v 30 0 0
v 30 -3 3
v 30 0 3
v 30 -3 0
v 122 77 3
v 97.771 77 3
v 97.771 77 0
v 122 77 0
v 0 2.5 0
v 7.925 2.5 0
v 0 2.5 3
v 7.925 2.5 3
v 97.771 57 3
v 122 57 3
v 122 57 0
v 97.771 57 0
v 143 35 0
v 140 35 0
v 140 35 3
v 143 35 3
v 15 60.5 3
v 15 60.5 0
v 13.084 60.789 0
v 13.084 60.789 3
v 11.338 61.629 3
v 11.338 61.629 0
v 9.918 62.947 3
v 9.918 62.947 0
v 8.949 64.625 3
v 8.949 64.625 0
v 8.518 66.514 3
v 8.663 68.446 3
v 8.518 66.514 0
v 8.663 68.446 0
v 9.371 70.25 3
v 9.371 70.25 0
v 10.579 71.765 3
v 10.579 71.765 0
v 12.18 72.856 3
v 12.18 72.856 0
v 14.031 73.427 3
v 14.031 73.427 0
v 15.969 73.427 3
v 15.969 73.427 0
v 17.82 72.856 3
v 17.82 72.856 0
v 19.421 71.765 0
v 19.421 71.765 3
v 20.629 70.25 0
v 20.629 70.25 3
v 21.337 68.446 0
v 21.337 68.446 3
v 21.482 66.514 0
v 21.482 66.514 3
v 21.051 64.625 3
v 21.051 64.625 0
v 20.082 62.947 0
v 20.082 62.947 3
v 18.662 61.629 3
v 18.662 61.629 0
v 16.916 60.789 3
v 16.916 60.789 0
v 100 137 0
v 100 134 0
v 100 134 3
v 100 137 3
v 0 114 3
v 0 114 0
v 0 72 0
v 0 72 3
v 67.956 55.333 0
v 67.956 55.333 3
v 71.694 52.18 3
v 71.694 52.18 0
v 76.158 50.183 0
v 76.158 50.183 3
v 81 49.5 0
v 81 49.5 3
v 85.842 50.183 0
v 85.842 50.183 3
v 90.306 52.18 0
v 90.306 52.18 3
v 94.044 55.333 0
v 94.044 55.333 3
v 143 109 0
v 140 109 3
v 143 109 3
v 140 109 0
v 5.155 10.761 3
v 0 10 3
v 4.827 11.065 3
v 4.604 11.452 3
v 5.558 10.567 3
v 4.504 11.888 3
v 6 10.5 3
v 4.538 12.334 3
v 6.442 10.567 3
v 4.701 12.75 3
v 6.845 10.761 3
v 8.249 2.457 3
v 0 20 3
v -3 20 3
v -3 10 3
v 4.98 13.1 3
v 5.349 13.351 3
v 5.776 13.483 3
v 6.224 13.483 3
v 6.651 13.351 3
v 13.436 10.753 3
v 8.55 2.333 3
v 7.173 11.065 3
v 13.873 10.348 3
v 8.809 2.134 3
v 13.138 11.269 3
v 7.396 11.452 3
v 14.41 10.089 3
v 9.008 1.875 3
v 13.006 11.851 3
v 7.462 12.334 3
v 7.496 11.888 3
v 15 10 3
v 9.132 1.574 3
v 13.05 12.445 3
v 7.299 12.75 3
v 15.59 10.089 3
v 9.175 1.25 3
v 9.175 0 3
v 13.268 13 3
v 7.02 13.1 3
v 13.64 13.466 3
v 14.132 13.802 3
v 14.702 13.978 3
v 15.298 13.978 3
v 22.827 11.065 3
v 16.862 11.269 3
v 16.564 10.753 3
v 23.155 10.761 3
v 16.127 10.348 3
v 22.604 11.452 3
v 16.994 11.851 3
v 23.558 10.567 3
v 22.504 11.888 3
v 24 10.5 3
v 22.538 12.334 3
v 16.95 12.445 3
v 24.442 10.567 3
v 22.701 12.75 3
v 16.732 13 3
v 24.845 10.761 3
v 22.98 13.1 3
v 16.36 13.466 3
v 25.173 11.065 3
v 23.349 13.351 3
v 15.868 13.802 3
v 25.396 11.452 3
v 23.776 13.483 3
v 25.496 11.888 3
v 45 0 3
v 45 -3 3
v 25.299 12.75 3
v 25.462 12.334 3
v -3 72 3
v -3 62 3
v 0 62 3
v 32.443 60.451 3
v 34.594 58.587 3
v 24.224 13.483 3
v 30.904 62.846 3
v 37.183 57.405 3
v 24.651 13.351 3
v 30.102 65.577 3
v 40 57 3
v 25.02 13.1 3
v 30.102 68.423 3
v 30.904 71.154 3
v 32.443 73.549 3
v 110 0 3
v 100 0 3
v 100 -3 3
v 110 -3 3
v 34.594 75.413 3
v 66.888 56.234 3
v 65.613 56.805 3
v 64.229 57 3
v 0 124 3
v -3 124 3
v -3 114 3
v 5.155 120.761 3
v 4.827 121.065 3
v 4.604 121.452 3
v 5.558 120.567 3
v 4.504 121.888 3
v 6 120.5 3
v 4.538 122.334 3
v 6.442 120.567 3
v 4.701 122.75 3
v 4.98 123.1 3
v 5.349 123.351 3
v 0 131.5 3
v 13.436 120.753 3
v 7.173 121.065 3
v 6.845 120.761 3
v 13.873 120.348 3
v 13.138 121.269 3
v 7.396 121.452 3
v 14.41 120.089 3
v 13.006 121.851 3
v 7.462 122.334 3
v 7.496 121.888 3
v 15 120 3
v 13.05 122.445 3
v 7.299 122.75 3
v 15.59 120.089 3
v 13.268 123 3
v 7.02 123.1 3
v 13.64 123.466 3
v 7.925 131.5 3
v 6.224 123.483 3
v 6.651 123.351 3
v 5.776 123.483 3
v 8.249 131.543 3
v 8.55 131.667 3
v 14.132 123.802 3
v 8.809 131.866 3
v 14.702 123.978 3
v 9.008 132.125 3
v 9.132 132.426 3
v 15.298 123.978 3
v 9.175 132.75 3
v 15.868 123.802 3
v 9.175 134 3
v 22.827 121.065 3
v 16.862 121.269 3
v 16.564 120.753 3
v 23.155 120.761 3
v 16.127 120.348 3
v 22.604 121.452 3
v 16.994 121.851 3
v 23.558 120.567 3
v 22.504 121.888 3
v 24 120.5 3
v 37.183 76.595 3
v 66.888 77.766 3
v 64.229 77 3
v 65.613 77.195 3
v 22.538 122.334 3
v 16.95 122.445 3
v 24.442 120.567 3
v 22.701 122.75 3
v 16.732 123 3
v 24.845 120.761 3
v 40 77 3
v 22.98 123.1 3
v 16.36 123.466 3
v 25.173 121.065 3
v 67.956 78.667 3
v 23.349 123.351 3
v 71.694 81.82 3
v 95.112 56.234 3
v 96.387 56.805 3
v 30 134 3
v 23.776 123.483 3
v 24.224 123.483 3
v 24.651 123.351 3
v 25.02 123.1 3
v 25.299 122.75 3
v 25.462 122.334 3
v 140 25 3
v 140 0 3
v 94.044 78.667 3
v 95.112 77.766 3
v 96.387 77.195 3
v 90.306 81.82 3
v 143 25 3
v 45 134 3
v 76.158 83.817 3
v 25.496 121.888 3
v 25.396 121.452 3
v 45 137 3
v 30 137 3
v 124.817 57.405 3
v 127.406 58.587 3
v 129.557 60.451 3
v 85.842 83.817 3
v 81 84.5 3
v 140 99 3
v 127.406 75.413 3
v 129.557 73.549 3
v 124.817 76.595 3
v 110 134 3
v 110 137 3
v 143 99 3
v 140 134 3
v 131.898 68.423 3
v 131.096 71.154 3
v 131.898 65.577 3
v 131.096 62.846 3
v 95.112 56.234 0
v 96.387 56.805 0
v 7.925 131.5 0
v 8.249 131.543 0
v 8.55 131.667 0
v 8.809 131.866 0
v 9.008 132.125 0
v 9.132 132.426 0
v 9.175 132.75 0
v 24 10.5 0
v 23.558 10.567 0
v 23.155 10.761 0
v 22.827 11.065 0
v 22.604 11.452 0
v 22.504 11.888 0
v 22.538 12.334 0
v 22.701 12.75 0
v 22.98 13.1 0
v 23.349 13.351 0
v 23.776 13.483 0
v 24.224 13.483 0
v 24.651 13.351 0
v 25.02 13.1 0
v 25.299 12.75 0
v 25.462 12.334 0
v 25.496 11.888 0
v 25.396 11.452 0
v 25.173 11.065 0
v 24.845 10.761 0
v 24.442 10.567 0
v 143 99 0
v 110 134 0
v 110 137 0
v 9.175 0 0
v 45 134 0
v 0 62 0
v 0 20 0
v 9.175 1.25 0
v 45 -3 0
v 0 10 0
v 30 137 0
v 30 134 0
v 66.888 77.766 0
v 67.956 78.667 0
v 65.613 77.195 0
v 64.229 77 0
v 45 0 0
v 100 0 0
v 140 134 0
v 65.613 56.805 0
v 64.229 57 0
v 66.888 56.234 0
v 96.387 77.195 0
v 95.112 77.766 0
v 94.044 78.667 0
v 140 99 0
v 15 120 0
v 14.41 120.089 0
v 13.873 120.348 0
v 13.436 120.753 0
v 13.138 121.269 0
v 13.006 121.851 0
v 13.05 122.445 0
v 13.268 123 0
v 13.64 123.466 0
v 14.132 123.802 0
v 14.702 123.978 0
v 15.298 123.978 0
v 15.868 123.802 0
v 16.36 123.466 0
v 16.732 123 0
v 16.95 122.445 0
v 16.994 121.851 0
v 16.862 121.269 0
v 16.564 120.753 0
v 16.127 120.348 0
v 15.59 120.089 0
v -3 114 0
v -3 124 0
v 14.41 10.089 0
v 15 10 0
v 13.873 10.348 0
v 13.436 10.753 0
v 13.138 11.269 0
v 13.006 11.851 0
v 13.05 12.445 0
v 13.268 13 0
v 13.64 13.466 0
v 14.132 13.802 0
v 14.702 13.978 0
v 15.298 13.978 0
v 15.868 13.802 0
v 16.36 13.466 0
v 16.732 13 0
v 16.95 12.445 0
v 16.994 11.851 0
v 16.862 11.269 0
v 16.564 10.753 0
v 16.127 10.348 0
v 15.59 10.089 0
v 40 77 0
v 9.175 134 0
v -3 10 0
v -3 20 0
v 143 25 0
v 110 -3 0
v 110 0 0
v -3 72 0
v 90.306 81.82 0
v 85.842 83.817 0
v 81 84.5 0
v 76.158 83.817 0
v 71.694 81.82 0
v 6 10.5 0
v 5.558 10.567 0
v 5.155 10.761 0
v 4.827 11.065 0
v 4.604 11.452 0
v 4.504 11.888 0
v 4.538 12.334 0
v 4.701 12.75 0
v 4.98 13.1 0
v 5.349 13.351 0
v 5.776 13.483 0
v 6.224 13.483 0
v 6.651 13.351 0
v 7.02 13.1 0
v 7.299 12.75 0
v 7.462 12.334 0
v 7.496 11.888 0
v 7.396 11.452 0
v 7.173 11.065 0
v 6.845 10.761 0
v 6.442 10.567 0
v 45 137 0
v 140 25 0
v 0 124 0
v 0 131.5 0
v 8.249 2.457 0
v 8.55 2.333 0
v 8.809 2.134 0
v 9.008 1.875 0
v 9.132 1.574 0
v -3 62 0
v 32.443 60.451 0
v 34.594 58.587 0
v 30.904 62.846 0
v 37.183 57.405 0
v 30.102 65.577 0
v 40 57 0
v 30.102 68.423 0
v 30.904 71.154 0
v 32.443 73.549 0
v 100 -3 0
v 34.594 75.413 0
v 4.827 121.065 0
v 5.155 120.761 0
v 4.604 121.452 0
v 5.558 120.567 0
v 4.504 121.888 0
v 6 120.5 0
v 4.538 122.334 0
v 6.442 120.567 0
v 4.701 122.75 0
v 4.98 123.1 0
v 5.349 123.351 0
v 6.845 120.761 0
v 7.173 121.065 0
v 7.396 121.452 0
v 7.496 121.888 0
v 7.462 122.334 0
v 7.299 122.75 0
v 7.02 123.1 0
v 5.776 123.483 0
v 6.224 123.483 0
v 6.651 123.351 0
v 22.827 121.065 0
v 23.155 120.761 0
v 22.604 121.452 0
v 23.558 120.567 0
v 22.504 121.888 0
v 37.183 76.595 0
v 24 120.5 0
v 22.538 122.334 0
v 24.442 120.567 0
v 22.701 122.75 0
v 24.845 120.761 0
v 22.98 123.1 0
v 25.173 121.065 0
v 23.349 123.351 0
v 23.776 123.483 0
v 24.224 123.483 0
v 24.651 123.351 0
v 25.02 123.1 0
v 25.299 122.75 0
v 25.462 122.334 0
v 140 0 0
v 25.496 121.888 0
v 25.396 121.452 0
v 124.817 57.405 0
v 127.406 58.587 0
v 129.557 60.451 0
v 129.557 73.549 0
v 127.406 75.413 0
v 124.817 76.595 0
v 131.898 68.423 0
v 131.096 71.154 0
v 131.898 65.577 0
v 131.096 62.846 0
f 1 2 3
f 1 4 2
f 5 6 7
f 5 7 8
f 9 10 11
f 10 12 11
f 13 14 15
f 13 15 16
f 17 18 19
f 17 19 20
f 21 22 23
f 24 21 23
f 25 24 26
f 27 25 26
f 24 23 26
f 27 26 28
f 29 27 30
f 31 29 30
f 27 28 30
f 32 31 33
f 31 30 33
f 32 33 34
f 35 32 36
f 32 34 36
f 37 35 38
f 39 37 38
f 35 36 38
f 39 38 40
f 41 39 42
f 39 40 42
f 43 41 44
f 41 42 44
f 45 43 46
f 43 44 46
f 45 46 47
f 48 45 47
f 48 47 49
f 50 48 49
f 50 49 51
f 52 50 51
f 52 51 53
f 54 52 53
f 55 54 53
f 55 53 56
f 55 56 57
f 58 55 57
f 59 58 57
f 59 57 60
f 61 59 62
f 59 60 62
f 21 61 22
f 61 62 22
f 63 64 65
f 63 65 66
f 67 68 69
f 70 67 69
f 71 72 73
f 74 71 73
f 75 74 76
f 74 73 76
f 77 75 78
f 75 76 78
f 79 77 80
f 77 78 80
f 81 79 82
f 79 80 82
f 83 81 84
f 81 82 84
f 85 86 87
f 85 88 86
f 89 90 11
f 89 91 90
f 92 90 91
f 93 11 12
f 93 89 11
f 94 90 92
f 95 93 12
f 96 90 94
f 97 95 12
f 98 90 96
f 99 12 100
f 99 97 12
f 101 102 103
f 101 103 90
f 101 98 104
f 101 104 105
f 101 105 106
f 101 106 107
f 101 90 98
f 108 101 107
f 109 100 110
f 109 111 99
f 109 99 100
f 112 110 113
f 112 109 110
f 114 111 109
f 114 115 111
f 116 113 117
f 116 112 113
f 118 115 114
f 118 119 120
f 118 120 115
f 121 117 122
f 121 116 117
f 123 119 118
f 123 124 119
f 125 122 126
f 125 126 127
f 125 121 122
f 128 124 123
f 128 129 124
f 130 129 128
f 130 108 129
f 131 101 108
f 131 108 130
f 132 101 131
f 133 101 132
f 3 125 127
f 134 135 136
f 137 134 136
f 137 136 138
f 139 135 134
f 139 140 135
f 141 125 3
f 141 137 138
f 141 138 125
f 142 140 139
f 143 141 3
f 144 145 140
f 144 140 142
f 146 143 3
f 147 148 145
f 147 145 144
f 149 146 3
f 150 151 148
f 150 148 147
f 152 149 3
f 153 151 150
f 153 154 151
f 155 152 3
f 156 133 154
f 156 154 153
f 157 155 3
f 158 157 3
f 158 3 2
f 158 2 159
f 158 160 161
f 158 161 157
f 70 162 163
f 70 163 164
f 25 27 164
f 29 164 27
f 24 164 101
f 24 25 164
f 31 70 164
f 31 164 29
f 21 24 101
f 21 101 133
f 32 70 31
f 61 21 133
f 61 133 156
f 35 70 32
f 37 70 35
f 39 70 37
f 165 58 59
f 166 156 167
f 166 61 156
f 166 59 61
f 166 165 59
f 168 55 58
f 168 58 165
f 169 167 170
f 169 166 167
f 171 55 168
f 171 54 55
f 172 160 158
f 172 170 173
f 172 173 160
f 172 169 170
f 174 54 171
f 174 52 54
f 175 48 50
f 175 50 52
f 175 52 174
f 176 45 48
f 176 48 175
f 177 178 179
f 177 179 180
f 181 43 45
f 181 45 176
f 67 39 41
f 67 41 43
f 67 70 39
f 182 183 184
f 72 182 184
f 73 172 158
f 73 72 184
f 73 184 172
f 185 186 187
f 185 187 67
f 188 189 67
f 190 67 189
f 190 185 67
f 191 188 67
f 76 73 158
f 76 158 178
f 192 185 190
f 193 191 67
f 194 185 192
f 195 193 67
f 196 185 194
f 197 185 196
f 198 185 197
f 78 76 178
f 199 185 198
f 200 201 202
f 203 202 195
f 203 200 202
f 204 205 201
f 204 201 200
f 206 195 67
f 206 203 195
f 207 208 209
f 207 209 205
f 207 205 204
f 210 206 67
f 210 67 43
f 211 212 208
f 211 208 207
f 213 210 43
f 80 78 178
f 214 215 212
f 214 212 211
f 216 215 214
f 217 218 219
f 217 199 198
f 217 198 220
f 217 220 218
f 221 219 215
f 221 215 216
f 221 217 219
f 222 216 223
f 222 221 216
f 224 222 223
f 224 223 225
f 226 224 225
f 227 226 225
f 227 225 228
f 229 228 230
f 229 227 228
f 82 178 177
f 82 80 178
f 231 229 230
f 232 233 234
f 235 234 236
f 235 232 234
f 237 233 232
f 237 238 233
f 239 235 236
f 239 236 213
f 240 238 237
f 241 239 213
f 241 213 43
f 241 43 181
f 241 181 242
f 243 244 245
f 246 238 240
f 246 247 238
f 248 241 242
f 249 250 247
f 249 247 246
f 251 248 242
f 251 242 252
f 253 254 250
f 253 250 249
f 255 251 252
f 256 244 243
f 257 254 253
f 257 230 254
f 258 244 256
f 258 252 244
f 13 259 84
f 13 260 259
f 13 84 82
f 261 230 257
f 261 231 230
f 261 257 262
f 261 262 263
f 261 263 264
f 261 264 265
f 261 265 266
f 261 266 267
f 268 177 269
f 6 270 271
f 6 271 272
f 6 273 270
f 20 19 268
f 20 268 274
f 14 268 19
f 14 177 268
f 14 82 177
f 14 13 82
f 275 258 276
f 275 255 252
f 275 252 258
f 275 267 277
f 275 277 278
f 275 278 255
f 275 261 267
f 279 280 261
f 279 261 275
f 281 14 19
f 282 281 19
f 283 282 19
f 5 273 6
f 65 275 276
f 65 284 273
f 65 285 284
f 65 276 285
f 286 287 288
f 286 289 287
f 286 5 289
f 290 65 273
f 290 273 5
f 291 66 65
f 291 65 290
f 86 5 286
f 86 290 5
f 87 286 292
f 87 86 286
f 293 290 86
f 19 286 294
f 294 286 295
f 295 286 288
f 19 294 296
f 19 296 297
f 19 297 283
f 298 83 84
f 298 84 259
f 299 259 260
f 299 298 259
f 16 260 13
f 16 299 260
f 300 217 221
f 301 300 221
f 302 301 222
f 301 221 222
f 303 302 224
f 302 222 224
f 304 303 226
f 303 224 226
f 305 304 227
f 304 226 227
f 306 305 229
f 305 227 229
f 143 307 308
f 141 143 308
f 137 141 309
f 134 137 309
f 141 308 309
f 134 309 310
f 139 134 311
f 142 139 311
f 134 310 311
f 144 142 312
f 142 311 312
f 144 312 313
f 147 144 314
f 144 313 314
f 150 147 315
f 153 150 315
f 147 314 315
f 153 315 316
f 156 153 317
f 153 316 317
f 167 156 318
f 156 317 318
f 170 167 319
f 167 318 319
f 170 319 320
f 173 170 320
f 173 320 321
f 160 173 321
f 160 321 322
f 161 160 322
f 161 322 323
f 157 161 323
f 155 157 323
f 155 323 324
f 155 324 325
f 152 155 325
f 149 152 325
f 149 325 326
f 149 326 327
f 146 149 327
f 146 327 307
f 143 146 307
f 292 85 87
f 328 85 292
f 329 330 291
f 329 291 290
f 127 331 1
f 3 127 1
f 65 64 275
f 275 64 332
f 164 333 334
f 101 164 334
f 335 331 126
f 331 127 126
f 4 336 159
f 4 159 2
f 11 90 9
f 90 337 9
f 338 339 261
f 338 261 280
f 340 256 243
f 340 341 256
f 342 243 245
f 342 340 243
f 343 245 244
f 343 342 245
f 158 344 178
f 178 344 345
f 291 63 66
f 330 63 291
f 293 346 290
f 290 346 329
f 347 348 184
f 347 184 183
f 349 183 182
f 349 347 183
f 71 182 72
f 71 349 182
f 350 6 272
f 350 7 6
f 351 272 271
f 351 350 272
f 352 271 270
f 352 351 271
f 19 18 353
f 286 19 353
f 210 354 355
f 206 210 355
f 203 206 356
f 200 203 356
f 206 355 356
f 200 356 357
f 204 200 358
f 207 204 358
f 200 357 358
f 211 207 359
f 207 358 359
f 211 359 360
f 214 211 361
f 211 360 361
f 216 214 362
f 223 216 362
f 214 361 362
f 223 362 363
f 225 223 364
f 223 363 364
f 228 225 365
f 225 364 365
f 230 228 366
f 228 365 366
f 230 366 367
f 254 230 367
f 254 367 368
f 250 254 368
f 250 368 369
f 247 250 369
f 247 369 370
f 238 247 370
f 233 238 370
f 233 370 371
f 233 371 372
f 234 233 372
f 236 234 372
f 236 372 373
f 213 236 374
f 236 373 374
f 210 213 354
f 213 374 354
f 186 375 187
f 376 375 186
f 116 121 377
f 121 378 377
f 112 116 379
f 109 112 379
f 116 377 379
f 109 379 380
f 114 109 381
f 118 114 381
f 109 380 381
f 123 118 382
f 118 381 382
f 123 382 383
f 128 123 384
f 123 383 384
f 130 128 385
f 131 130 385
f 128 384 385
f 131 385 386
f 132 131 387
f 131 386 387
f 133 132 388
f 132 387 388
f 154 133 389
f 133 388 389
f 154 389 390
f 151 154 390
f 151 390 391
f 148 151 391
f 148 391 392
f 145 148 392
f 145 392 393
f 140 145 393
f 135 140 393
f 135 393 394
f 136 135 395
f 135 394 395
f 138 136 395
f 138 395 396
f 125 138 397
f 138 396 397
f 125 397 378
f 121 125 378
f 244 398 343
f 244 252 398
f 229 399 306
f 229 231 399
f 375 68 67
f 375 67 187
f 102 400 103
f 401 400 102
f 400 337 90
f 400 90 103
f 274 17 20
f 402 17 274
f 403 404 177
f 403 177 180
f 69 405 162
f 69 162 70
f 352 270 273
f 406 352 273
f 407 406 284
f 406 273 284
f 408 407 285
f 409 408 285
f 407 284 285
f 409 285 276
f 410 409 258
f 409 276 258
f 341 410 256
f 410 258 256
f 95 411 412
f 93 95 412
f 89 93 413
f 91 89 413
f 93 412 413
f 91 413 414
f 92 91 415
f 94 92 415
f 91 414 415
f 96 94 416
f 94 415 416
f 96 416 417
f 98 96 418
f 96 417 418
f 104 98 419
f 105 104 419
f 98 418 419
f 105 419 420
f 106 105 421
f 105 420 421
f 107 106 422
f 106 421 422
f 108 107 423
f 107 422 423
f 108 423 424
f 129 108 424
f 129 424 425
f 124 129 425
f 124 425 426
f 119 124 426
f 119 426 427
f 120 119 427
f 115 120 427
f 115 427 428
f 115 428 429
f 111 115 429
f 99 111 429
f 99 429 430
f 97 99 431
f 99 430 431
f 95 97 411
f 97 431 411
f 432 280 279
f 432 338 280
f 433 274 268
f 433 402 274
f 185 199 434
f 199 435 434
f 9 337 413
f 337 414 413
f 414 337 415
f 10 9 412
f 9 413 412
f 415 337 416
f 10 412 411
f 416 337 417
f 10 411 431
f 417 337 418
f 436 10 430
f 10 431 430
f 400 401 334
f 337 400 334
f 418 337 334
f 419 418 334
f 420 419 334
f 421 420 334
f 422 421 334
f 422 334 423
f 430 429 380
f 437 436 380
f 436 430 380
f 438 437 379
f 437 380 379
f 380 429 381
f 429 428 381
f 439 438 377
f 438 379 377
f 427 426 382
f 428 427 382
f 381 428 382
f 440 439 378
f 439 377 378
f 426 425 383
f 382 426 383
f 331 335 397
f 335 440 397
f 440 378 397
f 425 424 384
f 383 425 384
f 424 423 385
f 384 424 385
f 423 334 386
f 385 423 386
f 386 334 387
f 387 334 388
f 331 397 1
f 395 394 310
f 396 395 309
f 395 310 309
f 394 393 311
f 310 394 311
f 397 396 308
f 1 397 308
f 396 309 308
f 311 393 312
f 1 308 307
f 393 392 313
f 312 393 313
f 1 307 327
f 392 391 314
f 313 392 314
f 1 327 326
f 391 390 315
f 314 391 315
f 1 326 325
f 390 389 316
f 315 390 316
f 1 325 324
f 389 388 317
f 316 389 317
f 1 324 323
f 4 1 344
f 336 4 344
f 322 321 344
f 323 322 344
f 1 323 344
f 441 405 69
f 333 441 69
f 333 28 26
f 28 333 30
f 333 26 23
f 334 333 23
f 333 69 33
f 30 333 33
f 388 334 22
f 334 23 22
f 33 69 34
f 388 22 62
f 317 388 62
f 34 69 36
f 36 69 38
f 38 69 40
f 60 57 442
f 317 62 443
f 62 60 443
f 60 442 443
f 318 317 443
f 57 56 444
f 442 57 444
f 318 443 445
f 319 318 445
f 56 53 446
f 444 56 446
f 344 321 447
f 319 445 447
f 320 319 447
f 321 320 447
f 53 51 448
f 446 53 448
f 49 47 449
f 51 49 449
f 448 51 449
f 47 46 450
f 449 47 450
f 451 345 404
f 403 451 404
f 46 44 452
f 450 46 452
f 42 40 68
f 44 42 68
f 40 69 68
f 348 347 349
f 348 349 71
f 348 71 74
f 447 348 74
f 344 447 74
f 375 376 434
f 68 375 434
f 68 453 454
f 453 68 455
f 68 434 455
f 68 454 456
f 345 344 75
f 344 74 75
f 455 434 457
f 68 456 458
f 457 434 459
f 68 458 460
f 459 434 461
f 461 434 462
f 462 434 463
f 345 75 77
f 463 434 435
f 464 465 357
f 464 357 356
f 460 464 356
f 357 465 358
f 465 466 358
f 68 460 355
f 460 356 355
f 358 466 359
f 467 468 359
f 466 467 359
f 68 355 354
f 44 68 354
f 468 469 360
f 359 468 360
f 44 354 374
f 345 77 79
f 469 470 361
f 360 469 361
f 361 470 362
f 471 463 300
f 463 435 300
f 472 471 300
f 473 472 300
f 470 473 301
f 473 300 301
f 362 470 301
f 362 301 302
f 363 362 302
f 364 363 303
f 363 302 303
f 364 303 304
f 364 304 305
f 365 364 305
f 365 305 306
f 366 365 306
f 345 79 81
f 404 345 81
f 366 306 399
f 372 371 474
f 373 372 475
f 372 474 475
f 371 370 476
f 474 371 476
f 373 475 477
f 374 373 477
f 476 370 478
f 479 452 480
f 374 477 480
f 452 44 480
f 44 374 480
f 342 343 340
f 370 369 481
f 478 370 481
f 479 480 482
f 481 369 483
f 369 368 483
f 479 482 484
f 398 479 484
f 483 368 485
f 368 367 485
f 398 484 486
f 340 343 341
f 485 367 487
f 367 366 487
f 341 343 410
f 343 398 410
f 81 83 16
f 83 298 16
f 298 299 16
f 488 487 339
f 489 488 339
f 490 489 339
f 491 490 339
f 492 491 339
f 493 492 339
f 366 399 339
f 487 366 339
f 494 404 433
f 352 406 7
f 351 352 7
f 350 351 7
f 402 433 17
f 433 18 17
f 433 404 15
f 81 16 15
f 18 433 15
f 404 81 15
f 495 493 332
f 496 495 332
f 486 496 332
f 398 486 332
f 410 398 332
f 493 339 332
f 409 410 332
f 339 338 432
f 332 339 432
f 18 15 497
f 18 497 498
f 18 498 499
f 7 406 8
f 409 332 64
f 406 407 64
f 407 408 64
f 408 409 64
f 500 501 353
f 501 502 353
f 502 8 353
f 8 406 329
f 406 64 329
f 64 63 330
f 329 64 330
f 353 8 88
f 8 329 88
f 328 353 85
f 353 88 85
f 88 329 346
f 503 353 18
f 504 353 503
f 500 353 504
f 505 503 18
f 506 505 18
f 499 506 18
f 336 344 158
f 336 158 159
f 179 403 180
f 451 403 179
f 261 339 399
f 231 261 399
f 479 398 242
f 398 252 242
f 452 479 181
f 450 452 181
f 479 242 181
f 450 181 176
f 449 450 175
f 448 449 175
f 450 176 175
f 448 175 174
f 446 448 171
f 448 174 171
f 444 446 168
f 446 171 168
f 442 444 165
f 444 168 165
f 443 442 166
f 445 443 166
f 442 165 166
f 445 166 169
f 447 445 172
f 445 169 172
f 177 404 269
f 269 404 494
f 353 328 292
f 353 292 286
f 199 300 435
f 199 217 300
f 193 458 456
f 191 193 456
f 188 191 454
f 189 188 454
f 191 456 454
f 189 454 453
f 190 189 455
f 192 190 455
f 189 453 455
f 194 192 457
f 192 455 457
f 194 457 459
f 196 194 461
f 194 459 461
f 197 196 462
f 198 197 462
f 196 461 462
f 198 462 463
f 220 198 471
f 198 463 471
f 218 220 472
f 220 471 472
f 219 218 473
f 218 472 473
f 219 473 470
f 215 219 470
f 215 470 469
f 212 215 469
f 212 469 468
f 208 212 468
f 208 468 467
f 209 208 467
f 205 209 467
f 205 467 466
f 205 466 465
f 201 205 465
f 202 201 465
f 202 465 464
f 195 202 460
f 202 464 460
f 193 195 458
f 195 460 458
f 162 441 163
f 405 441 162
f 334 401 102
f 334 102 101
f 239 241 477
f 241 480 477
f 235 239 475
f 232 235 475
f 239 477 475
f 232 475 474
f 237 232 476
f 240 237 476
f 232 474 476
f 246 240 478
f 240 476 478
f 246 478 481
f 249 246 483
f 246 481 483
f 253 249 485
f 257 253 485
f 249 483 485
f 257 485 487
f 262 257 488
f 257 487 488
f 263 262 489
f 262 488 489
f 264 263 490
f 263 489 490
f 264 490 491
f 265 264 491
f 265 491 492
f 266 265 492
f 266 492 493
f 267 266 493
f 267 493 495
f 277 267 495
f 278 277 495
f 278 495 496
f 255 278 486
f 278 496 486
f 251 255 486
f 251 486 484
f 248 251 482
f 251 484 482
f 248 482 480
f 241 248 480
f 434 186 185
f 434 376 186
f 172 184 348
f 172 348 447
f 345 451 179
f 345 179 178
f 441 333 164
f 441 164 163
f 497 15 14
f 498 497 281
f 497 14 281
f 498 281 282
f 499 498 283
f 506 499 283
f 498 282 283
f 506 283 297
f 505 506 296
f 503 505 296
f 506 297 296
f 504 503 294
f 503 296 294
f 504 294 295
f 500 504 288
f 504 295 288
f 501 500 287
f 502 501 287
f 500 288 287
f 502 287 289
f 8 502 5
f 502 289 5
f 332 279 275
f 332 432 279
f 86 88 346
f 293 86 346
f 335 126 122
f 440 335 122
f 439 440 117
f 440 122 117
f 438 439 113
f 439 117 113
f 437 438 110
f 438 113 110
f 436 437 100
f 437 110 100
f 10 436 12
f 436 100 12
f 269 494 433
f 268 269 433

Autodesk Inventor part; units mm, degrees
ref_plane "YZ Plane" through (0, 0, 0) normal (1, 0, 0) x (0, 1, 0)
ref_plane "XZ Plane" through (0, 0, 0) normal (0, 1, 0) x (-1, 0, 0)
ref_plane "XY Plane" through (0, 0, 0) normal (0, 0, 1) x (1, 0, 0)
sketch "Sketch1" plane through (0, 0, 0) normal (0, 0, 1) x (1, 0, 0)
  line L0 (0, 0) -> (140, 0)
  line L1 (140, 0) -> (140, 134)
  line L2 (140, 134) -> (0, 134)
  line L3 (0, 134) -> (0, 0)
  line L4 (30, 137) -> (45, 137)
  line L5 (45, 137) -> (45, -3)
  line L6 (45, -3) -> (30, -3)
  line L7 (30, -3) -> (30, 137)
  line L8 (100, 137) -> (110, 137)
  line L9 (110, 137) -> (110, -3)
  line L10 (110, -3) -> (100, -3)
  line L11 (100, -3) -> (100, 137)
  line L12 (-3, 124) -> (0, 124)
  line L13 (0, 124) -> (0, 114)
  line L14 (0, 114) -> (-3, 114)
  line L15 (-3, 114) -> (-3, 124)
  line L16 (-3, 20) -> (0, 20)
  line L17 (0, 20) -> (0, 10)
  line L18 (0, 10) -> (-3, 10)
  line L19 (-3, 10) -> (-3, 20)
  line L20 (-3, 72) -> (0, 72)
  line L21 (0, 72) -> (0, 62)
  line L22 (0, 62) -> (-3, 62)
  line L23 (-3, 62) -> (-3, 72)
  line L24 (140, 109) -> (143, 109)
  line L25 (143, 109) -> (143, 99)
  line L26 (143, 99) -> (140, 99)
  line L27 (140, 99) -> (140, 109)
  line L28 (140, 35) -> (143, 35)
  line L29 (143, 35) -> (143, 25)
  line L30 (143, 25) -> (140, 25)
  line L31 (140, 25) -> (140, 35)
  dimension "d0" = 140
  dimension "d1" = 134
  dimension "d2" = 140
  dimension "d3" = 3
  dimension "d4" = 15
  dimension "d5" = 10
  dimension "d6" = 140
  dimension "d7" = 3
  dimension "d8" = 30
  dimension "d9" = 30
  dimension "d10" = 10
  dimension "d11" = 3
  dimension "d13" = 10
  dimension "d14" = 3
  dimension "d16" = 10
  dimension "d17" = 10
  dimension "d74" = 10
  dimension "d75" = 42
  dimension "d76" = 3
  dimension "d77" = 10
  dimension "d78" = 3
  dimension "d79" = 25
  dimension "d80" = 10
  dimension "d81" = 25
  dimension "d82" = 3
extrude "Extrusion1" add sketch "Sketch1" along normal blind 3
sketch "Sketch2" plane through (0, 0, 3) normal (0, 0, 1) x (1, 0, 0)
  line L0 (40, 77) -> (122, 77)
  line L1 (132, 67) -> (132, 67)
  line L2 (122, 57) -> (40, 57)
  line L3 (30, 67) -> (30, 67)
  arc A0 (40, 77) -> (30, 67) centre (40, 67) ccw
  arc A1 (30, 67) -> (40, 57) centre (40, 67) ccw
  arc A2 (122, 57) -> (132, 67) centre (122, 67) ccw
  arc A3 (132, 67) -> (122, 77) centre (122, 67) ccw
  line L4 (140, 114) -> (140, 20) projected
  line L5 (45, 134) -> (100, 134) projected
  circle A4 centre (81, 67) radius 17.5
  point P0 (30, 77)
  point P1 (132, 77)
  point P2 (30, 57)
  dimension "d20" = 20
  dimension "d21" = 102
  dimension "d23" = 10
  dimension "d52" = 8
  dimension "d71" = 57
  dimension "d83" = 35
  dimension "d84" = 51
extrude "Extrusion2" cut sketch "Sketch2" against normal through all
sketch "Sketch3" plane through (0, 0, 3) normal (0, 0, 1) x (1, 0, 0)
  line L0 (0, 20) -> (0, 114) projected
  line L1 (0, 0) -> (0, 10) projected
  line L2 (30, 0) -> (0, 0) projected
  line L3 (0, 134) -> (30, 134) projected
  point P0 (15, 12)
  point P1 (15, 122)
  dimension "d26" = 15
  dimension "d27" = 12
  dimension "d28" = 15
  dimension "d48" = 12
hole "Hole1" at (15, 12, 3) at (15, 122, 3) direction (0, 0, -1) diameter 4 end through all
sketch "Sketch4" plane through (0, 0, 3) normal (0, 0, 1) x (1, 0, 0)
  circle A0 centre (15, 12) radius 2 projected
  circle A1 centre (15, 122) radius 2 projected
  point P0 (24, 122)
  point P1 (6, 122)
  point P2 (24, 12)
  point P3 (6, 12)
  dimension "d37" = 9
  dimension "d38" = 9
  dimension "d39" = 9
  dimension "d40" = 9
  dimension "d49" = 0
  dimension "d50" = 0
hole "Hole2" at (24, 122, 3) at (6, 122, 3) at (24, 12, 3) at (6, 12, 3) direction (0, 0, -1) diameter 3 end through all
sketch "Sketch5" plane through (0, 0, 3) normal (0, 0, 1) x (1, 0, 0)
  point P0 (15, 67)
hole "Hole3" at (15, 67, 3) direction (0, 0, -1) diameter 13 end through all
fillet "圓角1" radius 5 4 edges at (66.6386, 77, 1.5) (95.3614, 77, 1.5) (95.3614, 57, 1.5) (66.6386, 57, 1.5)
sketch "草圖7" plane through (0, 0, 3) normal (0, 0, 1) x (1, 0, 0)
  line L0 (0, 134) -> (9.175, 134)
  line L1 (9.175, 134) -> (9.175, 132.75)
  line L2 (7.925, 131.5) -> (0, 131.5)
  line L3 (0, 131.5) -> (0, 134)
  arc A0 (7.925, 131.5) -> (9.175, 132.75) centre (7.925, 132.75) ccw
  line L4 (0, 0) -> (9.175, 0)
  line L5 (9.175, 0) -> (9.175, 1.25)
  line L6 (7.925, 2.5) -> (0, 2.5)
  line L7 (0, 2.5) -> (0, 0)
  arc A1 (9.175, 1.25) -> (7.925, 2.5) centre (7.925, 1.25) ccw
  point P0 (9.175, 131.5)
  point P1 (9.175, 2.5)
  dimension "d86" = 9.175
  dimension "d88" = 2.5
  dimension "d89" = 1.25
  dimension "d90" = 9.175
  dimension "d91" = 2.5
  dimension "d92" = 1.25
extrude "擠出3" cut sketch "草圖7" against normal through all
equation "\"d93\" = d88"
properties part number "plastic_part_04"
